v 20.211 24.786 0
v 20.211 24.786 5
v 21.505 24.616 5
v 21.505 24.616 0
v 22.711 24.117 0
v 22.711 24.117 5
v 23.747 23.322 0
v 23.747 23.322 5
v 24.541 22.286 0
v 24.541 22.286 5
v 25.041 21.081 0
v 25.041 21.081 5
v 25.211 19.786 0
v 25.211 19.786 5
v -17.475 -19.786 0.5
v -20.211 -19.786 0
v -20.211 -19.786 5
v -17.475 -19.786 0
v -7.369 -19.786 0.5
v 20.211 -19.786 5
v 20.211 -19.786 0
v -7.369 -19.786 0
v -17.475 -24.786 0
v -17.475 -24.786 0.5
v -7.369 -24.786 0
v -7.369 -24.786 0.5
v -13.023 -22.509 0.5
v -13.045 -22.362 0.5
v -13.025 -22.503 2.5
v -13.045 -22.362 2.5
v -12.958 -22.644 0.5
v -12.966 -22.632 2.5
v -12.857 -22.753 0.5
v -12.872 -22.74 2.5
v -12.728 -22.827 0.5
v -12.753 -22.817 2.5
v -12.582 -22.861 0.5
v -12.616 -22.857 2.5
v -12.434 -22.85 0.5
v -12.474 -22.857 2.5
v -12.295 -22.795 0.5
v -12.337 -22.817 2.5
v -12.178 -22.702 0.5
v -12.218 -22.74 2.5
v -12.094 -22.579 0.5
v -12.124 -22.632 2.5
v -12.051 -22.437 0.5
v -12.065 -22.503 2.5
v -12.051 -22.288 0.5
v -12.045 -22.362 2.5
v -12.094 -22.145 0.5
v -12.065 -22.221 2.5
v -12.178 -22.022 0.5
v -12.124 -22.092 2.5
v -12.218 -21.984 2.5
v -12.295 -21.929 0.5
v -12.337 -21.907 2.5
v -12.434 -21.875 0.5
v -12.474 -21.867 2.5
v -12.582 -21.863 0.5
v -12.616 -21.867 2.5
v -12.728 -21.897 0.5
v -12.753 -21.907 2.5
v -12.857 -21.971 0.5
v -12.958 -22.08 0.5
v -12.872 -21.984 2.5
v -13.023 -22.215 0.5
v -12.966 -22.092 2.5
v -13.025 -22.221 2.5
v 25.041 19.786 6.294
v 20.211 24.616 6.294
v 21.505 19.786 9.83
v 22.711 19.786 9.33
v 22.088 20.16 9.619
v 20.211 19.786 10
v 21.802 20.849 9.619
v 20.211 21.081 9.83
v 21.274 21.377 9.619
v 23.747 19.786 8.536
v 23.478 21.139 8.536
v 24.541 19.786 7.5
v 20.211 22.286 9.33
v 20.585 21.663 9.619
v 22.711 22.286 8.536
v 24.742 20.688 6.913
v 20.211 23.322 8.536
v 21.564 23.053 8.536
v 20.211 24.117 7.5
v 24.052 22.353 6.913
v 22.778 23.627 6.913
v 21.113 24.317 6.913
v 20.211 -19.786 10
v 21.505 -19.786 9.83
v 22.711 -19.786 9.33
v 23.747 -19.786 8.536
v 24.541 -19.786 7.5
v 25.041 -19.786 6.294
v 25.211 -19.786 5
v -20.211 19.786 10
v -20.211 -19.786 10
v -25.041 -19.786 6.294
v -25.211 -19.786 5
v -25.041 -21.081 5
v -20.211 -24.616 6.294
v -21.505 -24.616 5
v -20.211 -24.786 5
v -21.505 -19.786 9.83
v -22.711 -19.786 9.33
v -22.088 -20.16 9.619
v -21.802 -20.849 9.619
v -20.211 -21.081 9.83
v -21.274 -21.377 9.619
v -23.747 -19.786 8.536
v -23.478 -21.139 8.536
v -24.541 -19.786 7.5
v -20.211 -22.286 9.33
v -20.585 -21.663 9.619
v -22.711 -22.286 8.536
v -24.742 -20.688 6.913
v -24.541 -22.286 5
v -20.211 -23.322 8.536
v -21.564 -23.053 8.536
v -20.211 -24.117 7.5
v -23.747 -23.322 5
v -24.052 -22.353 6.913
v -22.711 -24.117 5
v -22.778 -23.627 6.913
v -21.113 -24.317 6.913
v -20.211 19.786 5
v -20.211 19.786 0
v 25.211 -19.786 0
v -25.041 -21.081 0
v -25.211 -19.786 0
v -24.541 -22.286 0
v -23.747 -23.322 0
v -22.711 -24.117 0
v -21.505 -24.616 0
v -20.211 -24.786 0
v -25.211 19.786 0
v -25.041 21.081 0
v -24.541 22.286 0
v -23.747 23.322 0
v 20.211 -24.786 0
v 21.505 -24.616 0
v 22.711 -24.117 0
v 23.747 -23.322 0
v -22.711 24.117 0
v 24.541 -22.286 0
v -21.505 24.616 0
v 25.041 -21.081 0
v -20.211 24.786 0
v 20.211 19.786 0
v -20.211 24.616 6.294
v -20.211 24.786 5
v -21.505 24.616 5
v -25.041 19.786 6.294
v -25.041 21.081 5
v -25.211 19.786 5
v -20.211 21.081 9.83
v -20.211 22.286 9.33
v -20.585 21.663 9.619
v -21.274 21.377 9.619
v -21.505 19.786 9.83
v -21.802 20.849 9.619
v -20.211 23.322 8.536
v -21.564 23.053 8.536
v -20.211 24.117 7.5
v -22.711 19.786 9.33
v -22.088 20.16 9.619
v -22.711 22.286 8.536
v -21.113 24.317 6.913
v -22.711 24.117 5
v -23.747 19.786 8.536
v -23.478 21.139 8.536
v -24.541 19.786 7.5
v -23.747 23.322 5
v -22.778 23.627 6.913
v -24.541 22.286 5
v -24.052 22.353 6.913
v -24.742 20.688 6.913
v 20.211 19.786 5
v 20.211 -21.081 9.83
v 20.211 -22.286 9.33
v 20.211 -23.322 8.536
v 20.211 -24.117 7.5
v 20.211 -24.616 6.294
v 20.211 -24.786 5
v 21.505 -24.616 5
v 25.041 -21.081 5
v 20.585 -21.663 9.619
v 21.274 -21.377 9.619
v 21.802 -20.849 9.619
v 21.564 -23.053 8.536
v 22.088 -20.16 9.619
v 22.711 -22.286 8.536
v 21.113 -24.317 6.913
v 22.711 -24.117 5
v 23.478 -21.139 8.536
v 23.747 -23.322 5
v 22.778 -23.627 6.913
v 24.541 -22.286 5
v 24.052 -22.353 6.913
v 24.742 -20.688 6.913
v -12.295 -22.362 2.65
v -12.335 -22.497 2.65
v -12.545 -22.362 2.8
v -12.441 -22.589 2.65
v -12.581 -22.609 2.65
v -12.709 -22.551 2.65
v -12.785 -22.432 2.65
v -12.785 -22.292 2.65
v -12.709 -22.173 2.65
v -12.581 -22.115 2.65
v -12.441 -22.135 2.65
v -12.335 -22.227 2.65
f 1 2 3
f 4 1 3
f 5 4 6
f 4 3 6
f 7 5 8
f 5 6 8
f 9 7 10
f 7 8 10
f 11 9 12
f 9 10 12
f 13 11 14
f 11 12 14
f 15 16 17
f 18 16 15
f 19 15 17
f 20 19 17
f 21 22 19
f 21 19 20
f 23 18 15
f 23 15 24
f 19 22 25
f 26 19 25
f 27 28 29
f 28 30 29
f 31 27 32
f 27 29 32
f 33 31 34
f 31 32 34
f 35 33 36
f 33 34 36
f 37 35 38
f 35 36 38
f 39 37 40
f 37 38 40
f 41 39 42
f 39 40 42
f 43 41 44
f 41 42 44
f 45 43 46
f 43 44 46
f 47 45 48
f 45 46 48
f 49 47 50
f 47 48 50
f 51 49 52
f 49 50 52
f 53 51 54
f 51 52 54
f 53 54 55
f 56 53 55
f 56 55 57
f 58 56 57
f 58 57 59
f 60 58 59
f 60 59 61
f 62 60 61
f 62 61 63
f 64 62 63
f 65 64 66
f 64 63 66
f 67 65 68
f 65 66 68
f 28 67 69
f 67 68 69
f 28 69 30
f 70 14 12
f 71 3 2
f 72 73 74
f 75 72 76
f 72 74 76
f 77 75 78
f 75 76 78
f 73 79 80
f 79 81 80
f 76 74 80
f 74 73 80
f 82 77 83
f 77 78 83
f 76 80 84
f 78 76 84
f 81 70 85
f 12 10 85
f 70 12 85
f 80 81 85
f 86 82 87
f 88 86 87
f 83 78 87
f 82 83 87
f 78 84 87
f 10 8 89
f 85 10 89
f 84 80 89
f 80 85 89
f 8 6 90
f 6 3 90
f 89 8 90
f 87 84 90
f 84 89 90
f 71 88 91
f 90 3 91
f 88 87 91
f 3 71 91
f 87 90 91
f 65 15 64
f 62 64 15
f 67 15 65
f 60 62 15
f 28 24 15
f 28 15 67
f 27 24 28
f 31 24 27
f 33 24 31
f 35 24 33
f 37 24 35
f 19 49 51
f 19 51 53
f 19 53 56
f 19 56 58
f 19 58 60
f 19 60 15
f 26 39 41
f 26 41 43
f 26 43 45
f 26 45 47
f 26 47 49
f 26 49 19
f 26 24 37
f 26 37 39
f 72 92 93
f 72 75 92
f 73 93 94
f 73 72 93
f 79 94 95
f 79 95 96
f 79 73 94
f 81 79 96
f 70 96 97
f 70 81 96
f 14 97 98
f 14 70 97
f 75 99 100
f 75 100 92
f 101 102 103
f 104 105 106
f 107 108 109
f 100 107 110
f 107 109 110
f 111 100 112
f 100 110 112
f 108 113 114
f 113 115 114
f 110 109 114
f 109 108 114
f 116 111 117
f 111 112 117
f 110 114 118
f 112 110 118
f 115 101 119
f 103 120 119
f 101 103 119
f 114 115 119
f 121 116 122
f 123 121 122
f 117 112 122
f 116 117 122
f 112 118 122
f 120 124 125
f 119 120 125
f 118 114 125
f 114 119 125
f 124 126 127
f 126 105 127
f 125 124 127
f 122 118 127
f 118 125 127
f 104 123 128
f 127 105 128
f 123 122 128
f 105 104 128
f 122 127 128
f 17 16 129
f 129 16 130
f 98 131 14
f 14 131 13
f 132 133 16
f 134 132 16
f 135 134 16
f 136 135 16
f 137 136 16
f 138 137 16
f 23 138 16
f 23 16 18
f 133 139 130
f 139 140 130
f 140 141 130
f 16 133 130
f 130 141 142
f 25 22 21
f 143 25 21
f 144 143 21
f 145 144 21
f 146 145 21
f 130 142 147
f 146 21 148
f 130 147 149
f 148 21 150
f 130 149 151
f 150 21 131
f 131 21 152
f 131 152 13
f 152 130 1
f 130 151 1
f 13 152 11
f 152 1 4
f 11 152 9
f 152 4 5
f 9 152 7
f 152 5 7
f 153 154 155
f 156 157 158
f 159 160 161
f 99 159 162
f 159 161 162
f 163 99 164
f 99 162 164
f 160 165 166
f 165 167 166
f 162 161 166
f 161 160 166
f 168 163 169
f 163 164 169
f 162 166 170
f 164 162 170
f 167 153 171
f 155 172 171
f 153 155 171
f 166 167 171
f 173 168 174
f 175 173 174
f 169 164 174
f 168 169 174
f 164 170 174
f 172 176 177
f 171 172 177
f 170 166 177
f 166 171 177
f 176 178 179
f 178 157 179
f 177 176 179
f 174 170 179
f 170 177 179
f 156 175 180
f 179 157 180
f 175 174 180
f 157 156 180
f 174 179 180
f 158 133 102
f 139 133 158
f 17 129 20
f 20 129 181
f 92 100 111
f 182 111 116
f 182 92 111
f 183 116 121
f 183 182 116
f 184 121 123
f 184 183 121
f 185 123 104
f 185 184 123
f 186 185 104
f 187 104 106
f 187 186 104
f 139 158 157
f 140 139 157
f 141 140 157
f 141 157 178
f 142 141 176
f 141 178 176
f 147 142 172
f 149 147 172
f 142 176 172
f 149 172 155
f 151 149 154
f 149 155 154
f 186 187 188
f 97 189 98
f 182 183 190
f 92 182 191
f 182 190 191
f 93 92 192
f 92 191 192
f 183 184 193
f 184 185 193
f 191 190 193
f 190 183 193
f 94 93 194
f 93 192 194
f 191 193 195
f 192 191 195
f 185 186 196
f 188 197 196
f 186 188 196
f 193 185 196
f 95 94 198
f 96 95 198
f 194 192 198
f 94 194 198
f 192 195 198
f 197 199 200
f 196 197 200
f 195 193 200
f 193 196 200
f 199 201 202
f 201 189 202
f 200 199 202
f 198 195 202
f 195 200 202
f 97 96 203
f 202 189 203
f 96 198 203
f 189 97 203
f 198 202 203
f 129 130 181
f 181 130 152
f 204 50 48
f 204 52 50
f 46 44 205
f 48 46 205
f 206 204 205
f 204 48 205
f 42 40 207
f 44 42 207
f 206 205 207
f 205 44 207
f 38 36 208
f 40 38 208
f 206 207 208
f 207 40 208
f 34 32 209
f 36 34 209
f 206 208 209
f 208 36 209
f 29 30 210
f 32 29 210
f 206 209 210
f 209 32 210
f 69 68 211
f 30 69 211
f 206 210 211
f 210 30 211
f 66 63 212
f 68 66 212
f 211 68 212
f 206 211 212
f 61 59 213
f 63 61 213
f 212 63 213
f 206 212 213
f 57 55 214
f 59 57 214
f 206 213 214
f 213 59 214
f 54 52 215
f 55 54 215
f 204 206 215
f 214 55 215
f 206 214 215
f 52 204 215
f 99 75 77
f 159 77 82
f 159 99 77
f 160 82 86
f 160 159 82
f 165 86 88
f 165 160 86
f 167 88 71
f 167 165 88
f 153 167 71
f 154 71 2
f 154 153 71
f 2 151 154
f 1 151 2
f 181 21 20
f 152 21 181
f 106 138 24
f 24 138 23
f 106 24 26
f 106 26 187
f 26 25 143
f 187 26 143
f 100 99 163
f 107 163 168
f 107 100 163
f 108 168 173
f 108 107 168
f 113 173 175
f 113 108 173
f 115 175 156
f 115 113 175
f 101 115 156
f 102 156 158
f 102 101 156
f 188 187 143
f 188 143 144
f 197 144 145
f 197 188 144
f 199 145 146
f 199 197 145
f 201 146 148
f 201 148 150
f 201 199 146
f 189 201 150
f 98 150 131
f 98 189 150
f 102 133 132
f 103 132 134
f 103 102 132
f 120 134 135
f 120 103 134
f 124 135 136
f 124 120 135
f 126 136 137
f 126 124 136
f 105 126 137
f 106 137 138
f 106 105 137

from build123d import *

# Parameters (mm, degrees)
F0_W     = 50.4226610065
F0_H     = 49.5728440583
F1_DEPTH = 10
F2_T     = -5
F3_W     = 10.1061211899
F3_H     = 5
F4_DEPTH = 0.5
F7_D     = 1
F7_DEPTH = 2
F7_TIP   = 0.3004303095
F8_R     = 5
F9_R     = 5


# Not quite as in the source:
# - a feature names something its author has since deleted; it is built from what else it names


with BuildPart() as f1:
    # F0 (on Top) → F1 (new body)
    with BuildSketch(Plane.XY):
        Rectangle(F0_W, F0_H)
    extrude(amount=F1_DEPTH)

    # F2
    f2_openings = [f1.faces().sort_by_distance(p)[0] for p in [
        (0, 0, 0),
    ]]
    offset(amount=F2_T, openings=f2_openings)

    # F3 (on face) → F4 (cut)
    with BuildSketch(Plane(origin=(0, 0, 0), x_dir=(1, 0, 0), z_dir=(0, 0, -1))):
        with Locations((-12.4224121682, 22.2864220291)):
            Rectangle(F3_W, F3_H)
    extrude(amount=-F4_DEPTH, mode=Mode.SUBTRACT)

    # F7
    with Locations(Plane(origin=(0, 0, 0.5), x_dir=(1, 0, 0), z_dir=(0, 0, -1))):
        with Locations((-12.5449625775, 22.3620422184)):
            Hole(F7_D / 2, depth=F7_DEPTH)
            with Locations((0, 0, -(F7_DEPTH + F7_TIP / 2))):  # 118° drill point
                Cone(0, F7_D / 2, F7_TIP, mode=Mode.SUBTRACT)

    # F8
    f8_edges = [f1.edges().sort_by_distance(p)[0] for p in [
        (-25.211331, -24.786422, 5),
        (25.211331, -24.786422, 5),
        (25.211331, 24.786422, 5),
        (-25.211331, 24.786422, 5),
    ]]
    fillet(f8_edges, radius=F8_R)

    # F9
    f9_edges = [f1.edges().sort_by_distance(p)[0] for p in [
        (25.211331, 0, 10),
        (23.746864, -23.321956, 10),
        (23.746864, 23.321956, 10),
        (0, -24.786422, 10),
        (0, 24.786422, 10),
        (-23.746864, -23.321956, 10),
        (-23.746864, 23.321956, 10),
        (-25.211331, 0, 10),
    ]]
    fillet(f9_edges, radius=F9_R)


solid = f1.part
